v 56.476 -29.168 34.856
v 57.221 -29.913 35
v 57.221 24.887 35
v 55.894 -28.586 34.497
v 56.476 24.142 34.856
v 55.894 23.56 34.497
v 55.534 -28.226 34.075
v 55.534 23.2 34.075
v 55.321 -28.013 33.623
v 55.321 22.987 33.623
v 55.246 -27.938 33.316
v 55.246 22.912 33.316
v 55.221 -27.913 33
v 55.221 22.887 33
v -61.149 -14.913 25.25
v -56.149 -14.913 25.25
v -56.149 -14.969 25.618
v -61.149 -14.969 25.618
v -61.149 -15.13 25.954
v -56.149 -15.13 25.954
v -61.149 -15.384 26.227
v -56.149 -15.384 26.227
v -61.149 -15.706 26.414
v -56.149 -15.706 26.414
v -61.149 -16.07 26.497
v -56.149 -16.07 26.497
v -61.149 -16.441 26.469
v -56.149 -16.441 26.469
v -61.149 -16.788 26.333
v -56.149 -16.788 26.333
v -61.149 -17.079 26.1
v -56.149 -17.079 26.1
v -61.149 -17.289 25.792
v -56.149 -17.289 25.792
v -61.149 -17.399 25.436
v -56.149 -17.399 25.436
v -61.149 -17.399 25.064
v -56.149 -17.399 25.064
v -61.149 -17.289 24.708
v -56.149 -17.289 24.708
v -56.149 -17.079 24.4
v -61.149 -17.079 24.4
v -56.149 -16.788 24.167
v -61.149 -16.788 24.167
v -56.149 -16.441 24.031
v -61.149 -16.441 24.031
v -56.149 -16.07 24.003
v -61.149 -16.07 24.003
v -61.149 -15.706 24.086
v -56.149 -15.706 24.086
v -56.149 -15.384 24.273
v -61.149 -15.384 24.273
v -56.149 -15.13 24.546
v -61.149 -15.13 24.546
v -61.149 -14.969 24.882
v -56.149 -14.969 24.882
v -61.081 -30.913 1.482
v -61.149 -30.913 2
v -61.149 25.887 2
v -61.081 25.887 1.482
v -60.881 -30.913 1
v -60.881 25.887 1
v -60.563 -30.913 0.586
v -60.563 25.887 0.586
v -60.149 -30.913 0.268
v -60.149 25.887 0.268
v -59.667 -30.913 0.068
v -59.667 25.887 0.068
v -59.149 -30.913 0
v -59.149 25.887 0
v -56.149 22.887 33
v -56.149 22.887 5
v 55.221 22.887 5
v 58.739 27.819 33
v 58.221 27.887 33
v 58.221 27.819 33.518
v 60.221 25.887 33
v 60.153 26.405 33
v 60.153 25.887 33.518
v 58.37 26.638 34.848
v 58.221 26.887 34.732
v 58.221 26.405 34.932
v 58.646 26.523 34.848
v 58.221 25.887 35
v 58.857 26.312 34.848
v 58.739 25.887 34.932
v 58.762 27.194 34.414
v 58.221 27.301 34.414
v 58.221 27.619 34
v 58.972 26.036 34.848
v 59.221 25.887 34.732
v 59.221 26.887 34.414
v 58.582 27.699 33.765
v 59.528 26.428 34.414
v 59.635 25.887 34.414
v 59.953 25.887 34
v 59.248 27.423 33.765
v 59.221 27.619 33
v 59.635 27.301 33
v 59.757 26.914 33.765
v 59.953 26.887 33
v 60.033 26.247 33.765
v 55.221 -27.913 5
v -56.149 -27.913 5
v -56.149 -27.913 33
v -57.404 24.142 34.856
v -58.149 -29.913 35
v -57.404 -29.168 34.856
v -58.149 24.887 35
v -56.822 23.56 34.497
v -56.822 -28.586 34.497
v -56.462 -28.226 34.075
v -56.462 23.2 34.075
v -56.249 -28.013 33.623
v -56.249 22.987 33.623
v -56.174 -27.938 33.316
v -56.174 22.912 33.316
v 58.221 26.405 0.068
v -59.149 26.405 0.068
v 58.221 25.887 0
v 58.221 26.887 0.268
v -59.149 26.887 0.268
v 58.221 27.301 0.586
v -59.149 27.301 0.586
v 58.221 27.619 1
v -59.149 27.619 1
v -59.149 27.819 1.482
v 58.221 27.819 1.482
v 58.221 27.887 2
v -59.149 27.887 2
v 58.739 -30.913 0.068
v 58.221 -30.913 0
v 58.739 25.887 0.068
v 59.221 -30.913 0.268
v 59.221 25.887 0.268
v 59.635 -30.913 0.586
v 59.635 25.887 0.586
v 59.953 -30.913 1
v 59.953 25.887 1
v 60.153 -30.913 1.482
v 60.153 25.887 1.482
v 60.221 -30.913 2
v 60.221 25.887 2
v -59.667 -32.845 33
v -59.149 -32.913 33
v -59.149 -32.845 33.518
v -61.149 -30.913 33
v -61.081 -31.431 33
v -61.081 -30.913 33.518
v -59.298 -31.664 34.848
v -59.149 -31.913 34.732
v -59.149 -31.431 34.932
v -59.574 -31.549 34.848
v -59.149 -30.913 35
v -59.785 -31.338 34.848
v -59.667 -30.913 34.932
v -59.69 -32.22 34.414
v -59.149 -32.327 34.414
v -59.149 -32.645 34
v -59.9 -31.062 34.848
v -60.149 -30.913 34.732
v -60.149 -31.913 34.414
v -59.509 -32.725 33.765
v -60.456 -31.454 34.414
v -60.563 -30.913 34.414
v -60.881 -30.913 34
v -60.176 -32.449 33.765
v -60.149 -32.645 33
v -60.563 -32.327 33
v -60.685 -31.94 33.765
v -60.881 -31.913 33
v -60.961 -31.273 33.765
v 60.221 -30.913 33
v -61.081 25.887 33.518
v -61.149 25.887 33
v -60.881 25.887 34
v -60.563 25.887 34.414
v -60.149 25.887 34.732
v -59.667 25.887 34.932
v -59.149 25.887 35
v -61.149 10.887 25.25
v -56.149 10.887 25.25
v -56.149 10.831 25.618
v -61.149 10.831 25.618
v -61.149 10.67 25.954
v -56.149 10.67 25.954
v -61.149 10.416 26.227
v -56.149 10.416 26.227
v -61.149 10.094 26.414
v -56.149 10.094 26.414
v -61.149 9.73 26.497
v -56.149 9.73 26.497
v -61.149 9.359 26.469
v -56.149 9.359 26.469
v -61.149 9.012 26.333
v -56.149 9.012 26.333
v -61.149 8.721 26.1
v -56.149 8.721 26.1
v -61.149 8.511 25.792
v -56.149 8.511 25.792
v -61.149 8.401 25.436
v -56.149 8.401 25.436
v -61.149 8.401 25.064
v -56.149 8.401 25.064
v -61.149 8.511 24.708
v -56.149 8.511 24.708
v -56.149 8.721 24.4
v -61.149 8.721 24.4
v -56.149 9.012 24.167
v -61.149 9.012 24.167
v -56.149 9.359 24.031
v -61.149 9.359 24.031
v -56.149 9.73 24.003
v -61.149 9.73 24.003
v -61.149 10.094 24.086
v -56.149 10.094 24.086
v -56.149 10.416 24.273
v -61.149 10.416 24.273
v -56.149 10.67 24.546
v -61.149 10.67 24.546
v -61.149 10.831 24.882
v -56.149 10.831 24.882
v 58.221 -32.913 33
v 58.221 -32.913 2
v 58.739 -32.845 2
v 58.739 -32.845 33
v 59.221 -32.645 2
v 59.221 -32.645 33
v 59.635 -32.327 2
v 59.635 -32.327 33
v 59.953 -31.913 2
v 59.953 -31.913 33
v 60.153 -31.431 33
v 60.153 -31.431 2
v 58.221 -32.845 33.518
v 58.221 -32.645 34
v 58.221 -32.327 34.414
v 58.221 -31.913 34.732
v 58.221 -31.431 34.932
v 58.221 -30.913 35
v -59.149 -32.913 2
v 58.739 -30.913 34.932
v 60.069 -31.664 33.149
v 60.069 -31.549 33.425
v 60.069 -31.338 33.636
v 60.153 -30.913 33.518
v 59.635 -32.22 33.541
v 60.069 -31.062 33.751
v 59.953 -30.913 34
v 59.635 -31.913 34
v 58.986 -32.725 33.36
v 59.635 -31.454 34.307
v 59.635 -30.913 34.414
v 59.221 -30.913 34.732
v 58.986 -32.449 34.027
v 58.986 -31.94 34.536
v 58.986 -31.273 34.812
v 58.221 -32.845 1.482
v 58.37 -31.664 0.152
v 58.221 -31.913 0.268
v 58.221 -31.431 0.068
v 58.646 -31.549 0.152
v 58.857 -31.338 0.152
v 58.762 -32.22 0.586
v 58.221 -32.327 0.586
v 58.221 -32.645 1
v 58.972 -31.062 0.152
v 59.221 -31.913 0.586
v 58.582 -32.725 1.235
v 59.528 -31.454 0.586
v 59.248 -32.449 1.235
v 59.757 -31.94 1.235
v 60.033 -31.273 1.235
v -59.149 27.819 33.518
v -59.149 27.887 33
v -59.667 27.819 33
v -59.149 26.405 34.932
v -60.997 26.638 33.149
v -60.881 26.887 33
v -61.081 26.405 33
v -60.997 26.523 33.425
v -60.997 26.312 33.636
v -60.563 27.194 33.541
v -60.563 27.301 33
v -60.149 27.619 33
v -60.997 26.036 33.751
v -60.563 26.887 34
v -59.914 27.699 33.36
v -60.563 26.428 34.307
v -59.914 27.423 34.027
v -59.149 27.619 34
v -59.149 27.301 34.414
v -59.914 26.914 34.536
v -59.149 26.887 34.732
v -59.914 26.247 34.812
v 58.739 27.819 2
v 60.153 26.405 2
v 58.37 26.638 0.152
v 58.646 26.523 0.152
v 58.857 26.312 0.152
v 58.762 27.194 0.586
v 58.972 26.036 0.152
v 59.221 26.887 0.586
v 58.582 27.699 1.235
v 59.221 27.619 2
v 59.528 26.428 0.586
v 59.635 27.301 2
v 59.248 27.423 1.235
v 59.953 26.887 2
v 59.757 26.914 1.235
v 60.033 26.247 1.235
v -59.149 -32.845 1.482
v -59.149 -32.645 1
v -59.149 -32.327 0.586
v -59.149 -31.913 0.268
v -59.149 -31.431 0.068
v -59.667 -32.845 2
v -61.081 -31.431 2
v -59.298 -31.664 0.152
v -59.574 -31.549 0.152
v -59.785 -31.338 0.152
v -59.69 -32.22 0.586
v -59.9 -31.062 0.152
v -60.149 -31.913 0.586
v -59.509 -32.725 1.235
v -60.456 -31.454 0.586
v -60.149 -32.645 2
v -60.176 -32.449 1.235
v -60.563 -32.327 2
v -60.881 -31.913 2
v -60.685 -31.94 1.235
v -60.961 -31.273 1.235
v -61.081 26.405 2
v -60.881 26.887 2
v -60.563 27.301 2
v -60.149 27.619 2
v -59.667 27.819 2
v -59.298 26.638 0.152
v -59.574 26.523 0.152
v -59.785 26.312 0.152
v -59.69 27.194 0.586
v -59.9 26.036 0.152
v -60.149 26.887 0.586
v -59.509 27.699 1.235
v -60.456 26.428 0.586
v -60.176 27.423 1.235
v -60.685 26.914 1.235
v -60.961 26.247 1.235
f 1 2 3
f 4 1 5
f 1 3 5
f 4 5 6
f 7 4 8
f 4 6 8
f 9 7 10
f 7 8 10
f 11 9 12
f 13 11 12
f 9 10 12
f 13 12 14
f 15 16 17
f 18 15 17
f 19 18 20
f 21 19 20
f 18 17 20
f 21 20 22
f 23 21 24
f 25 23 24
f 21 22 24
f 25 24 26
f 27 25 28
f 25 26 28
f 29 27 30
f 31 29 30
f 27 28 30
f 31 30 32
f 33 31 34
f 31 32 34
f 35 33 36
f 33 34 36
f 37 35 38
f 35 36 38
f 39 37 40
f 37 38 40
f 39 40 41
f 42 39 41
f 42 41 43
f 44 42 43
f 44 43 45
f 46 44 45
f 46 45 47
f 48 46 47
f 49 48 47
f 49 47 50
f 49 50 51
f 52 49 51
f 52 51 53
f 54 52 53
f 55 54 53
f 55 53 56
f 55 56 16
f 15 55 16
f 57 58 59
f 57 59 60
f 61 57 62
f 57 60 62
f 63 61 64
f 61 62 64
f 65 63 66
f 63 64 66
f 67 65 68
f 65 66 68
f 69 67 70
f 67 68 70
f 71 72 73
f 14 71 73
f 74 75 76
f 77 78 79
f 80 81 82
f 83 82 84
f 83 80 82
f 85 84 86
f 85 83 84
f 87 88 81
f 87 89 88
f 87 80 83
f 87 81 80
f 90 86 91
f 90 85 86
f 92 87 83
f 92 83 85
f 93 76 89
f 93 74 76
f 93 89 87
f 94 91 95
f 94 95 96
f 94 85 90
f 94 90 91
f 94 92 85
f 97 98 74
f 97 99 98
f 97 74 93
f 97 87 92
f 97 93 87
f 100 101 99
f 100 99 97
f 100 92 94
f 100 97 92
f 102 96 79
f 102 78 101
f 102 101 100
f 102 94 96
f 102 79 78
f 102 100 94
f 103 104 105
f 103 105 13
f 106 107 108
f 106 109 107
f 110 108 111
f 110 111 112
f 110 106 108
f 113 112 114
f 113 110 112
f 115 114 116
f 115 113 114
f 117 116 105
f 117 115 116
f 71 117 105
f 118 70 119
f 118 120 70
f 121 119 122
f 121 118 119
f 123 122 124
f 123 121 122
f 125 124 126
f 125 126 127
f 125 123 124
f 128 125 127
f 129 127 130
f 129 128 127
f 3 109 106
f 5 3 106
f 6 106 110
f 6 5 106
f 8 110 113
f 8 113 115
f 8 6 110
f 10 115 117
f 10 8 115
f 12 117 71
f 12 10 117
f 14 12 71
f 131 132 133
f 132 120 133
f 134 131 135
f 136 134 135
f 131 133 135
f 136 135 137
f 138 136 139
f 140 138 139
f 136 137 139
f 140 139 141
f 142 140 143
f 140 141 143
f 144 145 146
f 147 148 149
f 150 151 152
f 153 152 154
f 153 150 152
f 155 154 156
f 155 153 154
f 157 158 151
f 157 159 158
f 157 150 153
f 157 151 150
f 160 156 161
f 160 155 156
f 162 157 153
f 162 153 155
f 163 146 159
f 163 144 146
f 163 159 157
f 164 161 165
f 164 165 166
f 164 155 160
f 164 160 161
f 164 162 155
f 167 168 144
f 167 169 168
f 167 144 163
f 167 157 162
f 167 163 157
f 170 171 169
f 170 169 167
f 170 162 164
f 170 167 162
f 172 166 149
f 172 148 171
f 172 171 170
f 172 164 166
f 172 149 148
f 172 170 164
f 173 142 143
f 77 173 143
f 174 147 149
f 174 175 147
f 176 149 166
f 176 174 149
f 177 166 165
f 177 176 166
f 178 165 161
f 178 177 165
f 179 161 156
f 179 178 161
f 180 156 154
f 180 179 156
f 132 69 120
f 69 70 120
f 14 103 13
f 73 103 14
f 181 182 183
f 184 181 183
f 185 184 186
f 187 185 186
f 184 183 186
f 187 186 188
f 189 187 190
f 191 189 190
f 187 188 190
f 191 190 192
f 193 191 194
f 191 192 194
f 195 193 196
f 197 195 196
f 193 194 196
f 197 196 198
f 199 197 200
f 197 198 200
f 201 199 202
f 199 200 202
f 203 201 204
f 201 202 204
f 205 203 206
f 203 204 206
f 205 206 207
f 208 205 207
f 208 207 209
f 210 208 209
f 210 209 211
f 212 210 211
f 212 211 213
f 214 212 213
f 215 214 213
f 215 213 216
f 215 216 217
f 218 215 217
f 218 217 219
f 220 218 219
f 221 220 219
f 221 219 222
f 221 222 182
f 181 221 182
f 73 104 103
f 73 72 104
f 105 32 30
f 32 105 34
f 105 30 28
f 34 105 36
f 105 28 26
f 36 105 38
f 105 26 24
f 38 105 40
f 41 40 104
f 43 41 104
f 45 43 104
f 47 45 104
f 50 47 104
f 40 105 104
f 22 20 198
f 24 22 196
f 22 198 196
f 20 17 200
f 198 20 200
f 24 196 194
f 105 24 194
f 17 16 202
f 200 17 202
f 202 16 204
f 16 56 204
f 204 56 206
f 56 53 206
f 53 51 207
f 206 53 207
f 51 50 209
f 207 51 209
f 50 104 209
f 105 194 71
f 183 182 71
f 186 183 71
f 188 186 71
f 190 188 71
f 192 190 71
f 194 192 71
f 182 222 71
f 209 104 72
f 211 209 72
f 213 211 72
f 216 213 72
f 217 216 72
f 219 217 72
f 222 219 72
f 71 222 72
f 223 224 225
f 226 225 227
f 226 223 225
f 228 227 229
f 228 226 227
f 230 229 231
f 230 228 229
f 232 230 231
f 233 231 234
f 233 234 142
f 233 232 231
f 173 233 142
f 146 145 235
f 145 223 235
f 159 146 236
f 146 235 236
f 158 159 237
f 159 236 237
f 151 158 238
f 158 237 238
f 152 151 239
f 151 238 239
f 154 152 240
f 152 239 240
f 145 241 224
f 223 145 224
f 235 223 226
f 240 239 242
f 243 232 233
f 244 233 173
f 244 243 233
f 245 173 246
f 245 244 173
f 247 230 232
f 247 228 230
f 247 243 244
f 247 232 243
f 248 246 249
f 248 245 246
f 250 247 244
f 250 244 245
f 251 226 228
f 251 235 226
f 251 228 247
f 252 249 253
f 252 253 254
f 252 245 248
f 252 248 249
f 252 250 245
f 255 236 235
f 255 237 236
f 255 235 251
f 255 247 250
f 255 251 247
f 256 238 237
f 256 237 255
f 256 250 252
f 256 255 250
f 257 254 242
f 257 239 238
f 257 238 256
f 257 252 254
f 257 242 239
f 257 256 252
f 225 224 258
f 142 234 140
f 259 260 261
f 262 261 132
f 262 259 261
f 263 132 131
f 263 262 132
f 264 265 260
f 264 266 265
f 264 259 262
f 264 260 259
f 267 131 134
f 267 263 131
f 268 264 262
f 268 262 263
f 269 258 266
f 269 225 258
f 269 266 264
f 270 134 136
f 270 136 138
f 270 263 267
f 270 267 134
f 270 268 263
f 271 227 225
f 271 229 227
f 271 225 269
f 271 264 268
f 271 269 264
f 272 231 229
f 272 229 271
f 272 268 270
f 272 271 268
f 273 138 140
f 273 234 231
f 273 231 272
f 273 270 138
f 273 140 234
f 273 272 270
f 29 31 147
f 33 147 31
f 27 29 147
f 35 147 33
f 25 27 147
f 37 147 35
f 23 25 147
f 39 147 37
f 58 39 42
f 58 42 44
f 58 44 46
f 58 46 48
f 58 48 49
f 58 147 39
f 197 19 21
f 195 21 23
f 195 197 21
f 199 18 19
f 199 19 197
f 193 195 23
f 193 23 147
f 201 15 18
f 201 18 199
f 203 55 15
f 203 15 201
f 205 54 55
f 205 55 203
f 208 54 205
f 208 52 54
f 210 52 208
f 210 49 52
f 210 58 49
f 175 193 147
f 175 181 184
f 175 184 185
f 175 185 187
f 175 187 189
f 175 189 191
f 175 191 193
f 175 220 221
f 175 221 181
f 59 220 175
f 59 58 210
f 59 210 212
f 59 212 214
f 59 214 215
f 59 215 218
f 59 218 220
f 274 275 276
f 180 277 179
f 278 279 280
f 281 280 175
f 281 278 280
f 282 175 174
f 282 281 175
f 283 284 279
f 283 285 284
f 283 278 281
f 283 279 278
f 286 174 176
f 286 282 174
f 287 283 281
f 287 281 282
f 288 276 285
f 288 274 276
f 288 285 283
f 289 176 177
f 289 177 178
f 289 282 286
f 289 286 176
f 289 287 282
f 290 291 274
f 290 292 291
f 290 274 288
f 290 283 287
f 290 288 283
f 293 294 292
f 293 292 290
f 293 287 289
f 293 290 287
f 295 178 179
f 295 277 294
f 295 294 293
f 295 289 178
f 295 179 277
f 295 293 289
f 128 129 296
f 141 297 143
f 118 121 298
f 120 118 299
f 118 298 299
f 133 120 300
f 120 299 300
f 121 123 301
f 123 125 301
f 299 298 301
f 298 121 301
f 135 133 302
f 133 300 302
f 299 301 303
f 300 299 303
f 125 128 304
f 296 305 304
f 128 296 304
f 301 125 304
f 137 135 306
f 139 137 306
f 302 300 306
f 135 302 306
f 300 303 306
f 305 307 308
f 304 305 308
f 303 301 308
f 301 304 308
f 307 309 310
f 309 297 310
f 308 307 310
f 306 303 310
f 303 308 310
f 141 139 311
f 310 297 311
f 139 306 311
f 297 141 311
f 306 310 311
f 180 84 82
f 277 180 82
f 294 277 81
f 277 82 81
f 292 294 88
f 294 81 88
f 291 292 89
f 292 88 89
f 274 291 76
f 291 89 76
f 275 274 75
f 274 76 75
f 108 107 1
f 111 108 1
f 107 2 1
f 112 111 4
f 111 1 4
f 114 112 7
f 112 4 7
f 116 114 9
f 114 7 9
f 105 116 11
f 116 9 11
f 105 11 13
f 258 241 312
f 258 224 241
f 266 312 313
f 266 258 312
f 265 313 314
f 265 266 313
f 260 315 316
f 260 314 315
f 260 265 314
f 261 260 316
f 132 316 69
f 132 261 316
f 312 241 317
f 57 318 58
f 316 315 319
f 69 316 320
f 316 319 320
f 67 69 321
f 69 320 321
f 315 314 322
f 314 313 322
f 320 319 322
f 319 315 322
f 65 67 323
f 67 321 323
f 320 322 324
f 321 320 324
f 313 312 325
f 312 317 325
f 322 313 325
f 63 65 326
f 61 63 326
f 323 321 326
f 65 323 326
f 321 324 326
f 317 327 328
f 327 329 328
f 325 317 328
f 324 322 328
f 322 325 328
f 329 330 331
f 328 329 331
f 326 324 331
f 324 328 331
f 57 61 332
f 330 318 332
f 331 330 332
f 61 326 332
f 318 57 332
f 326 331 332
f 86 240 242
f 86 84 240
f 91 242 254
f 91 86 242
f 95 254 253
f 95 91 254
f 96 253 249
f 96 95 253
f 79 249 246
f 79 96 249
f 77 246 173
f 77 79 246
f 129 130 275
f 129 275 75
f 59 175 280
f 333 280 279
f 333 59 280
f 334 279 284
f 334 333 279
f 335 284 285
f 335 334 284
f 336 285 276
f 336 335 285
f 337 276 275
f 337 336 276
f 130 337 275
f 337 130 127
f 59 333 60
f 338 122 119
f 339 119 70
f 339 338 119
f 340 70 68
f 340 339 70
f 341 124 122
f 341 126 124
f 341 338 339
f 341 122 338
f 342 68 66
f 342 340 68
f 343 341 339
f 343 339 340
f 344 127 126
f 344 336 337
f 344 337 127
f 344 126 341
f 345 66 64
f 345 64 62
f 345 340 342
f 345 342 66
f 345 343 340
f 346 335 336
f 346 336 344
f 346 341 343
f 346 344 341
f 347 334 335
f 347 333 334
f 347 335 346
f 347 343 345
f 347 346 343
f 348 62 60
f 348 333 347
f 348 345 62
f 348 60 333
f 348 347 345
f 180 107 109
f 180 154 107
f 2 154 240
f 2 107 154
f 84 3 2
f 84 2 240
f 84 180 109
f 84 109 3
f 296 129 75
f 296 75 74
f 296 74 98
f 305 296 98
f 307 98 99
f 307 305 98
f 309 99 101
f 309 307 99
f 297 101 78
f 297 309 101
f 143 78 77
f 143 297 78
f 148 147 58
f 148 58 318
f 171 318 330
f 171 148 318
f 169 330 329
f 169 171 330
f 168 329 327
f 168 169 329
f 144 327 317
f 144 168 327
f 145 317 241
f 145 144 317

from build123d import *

# Parameters (mm, degrees)
F0_W     = 121.37
F0_H     = 60.8
F0_W_2   = 111.37
F0_H_2   = 50.8
F1_DEPTH = 5
F2_DEPTH = 35
F3_R     = 1.25
F4_DEPTH = 75
F5_R     = 2


with BuildPart() as f1:
    # F0 (on Top) → F1 (new body)
    with BuildSketch(Plane.XY):
        with Locations((-0.463949, -2.512982)):
            Rectangle(F0_W, F0_H)
        with Locations((-0.463949, -2.512982)):
            Rectangle(F0_W_2, F0_H_2, mode=Mode.SUBTRACT)
        with Locations((-0.463949, -2.512982)):
            Rectangle(F0_W_2, F0_H_2)
    extrude(amount=F1_DEPTH)

    # F0 (on Top) → F2 (join)
    with BuildSketch(Plane.XY):
        with Locations((-0.463949, -2.512982)):
            Rectangle(F0_W, F0_H)
        with Locations((-0.463949, -2.512982)):
            Rectangle(F0_W_2, F0_H_2, mode=Mode.SUBTRACT)
    extrude(amount=F2_DEPTH)

    # F3 (on Right) → F4 (cut)
    with BuildSketch(Plane.YZ):
        with Locations((-16.162982, 25.25)):
            Circle(F3_R)
        with Locations((9.637018, 25.25)):
            Circle(F3_R)
    extrude(amount=-F4_DEPTH, mode=Mode.SUBTRACT)

    # F5
    f5_edges = [f1.edges().sort_by_distance(p)[0] for p in [
        (-61.148949, -32.912982, 17.5),
        (-0.463949, -32.912982, 35),
        (60.221051, -32.912982, 17.5),
        (-0.463949, -32.912982, 0),
        (60.221051, 27.887018, 17.5),
        (-0.463949, 27.887018, 35),
        (-61.148949, 27.887018, 17.5),
        (-0.463949, 27.887018, 0),
        (60.221051, -2.512982, 35),
        (60.221051, -2.512982, 0),
        (55.221051, -2.512982, 35),
        (-0.463949, 22.887018, 35),
        (-56.148949, -2.512982, 35),
        (-0.463949, -27.912982, 35),
        (-61.148949, -2.512982, 35),
        (-61.148949, -2.512982, 0),
    ]]
    fillet(f5_edges, radius=F5_R)


solid = f1.part
